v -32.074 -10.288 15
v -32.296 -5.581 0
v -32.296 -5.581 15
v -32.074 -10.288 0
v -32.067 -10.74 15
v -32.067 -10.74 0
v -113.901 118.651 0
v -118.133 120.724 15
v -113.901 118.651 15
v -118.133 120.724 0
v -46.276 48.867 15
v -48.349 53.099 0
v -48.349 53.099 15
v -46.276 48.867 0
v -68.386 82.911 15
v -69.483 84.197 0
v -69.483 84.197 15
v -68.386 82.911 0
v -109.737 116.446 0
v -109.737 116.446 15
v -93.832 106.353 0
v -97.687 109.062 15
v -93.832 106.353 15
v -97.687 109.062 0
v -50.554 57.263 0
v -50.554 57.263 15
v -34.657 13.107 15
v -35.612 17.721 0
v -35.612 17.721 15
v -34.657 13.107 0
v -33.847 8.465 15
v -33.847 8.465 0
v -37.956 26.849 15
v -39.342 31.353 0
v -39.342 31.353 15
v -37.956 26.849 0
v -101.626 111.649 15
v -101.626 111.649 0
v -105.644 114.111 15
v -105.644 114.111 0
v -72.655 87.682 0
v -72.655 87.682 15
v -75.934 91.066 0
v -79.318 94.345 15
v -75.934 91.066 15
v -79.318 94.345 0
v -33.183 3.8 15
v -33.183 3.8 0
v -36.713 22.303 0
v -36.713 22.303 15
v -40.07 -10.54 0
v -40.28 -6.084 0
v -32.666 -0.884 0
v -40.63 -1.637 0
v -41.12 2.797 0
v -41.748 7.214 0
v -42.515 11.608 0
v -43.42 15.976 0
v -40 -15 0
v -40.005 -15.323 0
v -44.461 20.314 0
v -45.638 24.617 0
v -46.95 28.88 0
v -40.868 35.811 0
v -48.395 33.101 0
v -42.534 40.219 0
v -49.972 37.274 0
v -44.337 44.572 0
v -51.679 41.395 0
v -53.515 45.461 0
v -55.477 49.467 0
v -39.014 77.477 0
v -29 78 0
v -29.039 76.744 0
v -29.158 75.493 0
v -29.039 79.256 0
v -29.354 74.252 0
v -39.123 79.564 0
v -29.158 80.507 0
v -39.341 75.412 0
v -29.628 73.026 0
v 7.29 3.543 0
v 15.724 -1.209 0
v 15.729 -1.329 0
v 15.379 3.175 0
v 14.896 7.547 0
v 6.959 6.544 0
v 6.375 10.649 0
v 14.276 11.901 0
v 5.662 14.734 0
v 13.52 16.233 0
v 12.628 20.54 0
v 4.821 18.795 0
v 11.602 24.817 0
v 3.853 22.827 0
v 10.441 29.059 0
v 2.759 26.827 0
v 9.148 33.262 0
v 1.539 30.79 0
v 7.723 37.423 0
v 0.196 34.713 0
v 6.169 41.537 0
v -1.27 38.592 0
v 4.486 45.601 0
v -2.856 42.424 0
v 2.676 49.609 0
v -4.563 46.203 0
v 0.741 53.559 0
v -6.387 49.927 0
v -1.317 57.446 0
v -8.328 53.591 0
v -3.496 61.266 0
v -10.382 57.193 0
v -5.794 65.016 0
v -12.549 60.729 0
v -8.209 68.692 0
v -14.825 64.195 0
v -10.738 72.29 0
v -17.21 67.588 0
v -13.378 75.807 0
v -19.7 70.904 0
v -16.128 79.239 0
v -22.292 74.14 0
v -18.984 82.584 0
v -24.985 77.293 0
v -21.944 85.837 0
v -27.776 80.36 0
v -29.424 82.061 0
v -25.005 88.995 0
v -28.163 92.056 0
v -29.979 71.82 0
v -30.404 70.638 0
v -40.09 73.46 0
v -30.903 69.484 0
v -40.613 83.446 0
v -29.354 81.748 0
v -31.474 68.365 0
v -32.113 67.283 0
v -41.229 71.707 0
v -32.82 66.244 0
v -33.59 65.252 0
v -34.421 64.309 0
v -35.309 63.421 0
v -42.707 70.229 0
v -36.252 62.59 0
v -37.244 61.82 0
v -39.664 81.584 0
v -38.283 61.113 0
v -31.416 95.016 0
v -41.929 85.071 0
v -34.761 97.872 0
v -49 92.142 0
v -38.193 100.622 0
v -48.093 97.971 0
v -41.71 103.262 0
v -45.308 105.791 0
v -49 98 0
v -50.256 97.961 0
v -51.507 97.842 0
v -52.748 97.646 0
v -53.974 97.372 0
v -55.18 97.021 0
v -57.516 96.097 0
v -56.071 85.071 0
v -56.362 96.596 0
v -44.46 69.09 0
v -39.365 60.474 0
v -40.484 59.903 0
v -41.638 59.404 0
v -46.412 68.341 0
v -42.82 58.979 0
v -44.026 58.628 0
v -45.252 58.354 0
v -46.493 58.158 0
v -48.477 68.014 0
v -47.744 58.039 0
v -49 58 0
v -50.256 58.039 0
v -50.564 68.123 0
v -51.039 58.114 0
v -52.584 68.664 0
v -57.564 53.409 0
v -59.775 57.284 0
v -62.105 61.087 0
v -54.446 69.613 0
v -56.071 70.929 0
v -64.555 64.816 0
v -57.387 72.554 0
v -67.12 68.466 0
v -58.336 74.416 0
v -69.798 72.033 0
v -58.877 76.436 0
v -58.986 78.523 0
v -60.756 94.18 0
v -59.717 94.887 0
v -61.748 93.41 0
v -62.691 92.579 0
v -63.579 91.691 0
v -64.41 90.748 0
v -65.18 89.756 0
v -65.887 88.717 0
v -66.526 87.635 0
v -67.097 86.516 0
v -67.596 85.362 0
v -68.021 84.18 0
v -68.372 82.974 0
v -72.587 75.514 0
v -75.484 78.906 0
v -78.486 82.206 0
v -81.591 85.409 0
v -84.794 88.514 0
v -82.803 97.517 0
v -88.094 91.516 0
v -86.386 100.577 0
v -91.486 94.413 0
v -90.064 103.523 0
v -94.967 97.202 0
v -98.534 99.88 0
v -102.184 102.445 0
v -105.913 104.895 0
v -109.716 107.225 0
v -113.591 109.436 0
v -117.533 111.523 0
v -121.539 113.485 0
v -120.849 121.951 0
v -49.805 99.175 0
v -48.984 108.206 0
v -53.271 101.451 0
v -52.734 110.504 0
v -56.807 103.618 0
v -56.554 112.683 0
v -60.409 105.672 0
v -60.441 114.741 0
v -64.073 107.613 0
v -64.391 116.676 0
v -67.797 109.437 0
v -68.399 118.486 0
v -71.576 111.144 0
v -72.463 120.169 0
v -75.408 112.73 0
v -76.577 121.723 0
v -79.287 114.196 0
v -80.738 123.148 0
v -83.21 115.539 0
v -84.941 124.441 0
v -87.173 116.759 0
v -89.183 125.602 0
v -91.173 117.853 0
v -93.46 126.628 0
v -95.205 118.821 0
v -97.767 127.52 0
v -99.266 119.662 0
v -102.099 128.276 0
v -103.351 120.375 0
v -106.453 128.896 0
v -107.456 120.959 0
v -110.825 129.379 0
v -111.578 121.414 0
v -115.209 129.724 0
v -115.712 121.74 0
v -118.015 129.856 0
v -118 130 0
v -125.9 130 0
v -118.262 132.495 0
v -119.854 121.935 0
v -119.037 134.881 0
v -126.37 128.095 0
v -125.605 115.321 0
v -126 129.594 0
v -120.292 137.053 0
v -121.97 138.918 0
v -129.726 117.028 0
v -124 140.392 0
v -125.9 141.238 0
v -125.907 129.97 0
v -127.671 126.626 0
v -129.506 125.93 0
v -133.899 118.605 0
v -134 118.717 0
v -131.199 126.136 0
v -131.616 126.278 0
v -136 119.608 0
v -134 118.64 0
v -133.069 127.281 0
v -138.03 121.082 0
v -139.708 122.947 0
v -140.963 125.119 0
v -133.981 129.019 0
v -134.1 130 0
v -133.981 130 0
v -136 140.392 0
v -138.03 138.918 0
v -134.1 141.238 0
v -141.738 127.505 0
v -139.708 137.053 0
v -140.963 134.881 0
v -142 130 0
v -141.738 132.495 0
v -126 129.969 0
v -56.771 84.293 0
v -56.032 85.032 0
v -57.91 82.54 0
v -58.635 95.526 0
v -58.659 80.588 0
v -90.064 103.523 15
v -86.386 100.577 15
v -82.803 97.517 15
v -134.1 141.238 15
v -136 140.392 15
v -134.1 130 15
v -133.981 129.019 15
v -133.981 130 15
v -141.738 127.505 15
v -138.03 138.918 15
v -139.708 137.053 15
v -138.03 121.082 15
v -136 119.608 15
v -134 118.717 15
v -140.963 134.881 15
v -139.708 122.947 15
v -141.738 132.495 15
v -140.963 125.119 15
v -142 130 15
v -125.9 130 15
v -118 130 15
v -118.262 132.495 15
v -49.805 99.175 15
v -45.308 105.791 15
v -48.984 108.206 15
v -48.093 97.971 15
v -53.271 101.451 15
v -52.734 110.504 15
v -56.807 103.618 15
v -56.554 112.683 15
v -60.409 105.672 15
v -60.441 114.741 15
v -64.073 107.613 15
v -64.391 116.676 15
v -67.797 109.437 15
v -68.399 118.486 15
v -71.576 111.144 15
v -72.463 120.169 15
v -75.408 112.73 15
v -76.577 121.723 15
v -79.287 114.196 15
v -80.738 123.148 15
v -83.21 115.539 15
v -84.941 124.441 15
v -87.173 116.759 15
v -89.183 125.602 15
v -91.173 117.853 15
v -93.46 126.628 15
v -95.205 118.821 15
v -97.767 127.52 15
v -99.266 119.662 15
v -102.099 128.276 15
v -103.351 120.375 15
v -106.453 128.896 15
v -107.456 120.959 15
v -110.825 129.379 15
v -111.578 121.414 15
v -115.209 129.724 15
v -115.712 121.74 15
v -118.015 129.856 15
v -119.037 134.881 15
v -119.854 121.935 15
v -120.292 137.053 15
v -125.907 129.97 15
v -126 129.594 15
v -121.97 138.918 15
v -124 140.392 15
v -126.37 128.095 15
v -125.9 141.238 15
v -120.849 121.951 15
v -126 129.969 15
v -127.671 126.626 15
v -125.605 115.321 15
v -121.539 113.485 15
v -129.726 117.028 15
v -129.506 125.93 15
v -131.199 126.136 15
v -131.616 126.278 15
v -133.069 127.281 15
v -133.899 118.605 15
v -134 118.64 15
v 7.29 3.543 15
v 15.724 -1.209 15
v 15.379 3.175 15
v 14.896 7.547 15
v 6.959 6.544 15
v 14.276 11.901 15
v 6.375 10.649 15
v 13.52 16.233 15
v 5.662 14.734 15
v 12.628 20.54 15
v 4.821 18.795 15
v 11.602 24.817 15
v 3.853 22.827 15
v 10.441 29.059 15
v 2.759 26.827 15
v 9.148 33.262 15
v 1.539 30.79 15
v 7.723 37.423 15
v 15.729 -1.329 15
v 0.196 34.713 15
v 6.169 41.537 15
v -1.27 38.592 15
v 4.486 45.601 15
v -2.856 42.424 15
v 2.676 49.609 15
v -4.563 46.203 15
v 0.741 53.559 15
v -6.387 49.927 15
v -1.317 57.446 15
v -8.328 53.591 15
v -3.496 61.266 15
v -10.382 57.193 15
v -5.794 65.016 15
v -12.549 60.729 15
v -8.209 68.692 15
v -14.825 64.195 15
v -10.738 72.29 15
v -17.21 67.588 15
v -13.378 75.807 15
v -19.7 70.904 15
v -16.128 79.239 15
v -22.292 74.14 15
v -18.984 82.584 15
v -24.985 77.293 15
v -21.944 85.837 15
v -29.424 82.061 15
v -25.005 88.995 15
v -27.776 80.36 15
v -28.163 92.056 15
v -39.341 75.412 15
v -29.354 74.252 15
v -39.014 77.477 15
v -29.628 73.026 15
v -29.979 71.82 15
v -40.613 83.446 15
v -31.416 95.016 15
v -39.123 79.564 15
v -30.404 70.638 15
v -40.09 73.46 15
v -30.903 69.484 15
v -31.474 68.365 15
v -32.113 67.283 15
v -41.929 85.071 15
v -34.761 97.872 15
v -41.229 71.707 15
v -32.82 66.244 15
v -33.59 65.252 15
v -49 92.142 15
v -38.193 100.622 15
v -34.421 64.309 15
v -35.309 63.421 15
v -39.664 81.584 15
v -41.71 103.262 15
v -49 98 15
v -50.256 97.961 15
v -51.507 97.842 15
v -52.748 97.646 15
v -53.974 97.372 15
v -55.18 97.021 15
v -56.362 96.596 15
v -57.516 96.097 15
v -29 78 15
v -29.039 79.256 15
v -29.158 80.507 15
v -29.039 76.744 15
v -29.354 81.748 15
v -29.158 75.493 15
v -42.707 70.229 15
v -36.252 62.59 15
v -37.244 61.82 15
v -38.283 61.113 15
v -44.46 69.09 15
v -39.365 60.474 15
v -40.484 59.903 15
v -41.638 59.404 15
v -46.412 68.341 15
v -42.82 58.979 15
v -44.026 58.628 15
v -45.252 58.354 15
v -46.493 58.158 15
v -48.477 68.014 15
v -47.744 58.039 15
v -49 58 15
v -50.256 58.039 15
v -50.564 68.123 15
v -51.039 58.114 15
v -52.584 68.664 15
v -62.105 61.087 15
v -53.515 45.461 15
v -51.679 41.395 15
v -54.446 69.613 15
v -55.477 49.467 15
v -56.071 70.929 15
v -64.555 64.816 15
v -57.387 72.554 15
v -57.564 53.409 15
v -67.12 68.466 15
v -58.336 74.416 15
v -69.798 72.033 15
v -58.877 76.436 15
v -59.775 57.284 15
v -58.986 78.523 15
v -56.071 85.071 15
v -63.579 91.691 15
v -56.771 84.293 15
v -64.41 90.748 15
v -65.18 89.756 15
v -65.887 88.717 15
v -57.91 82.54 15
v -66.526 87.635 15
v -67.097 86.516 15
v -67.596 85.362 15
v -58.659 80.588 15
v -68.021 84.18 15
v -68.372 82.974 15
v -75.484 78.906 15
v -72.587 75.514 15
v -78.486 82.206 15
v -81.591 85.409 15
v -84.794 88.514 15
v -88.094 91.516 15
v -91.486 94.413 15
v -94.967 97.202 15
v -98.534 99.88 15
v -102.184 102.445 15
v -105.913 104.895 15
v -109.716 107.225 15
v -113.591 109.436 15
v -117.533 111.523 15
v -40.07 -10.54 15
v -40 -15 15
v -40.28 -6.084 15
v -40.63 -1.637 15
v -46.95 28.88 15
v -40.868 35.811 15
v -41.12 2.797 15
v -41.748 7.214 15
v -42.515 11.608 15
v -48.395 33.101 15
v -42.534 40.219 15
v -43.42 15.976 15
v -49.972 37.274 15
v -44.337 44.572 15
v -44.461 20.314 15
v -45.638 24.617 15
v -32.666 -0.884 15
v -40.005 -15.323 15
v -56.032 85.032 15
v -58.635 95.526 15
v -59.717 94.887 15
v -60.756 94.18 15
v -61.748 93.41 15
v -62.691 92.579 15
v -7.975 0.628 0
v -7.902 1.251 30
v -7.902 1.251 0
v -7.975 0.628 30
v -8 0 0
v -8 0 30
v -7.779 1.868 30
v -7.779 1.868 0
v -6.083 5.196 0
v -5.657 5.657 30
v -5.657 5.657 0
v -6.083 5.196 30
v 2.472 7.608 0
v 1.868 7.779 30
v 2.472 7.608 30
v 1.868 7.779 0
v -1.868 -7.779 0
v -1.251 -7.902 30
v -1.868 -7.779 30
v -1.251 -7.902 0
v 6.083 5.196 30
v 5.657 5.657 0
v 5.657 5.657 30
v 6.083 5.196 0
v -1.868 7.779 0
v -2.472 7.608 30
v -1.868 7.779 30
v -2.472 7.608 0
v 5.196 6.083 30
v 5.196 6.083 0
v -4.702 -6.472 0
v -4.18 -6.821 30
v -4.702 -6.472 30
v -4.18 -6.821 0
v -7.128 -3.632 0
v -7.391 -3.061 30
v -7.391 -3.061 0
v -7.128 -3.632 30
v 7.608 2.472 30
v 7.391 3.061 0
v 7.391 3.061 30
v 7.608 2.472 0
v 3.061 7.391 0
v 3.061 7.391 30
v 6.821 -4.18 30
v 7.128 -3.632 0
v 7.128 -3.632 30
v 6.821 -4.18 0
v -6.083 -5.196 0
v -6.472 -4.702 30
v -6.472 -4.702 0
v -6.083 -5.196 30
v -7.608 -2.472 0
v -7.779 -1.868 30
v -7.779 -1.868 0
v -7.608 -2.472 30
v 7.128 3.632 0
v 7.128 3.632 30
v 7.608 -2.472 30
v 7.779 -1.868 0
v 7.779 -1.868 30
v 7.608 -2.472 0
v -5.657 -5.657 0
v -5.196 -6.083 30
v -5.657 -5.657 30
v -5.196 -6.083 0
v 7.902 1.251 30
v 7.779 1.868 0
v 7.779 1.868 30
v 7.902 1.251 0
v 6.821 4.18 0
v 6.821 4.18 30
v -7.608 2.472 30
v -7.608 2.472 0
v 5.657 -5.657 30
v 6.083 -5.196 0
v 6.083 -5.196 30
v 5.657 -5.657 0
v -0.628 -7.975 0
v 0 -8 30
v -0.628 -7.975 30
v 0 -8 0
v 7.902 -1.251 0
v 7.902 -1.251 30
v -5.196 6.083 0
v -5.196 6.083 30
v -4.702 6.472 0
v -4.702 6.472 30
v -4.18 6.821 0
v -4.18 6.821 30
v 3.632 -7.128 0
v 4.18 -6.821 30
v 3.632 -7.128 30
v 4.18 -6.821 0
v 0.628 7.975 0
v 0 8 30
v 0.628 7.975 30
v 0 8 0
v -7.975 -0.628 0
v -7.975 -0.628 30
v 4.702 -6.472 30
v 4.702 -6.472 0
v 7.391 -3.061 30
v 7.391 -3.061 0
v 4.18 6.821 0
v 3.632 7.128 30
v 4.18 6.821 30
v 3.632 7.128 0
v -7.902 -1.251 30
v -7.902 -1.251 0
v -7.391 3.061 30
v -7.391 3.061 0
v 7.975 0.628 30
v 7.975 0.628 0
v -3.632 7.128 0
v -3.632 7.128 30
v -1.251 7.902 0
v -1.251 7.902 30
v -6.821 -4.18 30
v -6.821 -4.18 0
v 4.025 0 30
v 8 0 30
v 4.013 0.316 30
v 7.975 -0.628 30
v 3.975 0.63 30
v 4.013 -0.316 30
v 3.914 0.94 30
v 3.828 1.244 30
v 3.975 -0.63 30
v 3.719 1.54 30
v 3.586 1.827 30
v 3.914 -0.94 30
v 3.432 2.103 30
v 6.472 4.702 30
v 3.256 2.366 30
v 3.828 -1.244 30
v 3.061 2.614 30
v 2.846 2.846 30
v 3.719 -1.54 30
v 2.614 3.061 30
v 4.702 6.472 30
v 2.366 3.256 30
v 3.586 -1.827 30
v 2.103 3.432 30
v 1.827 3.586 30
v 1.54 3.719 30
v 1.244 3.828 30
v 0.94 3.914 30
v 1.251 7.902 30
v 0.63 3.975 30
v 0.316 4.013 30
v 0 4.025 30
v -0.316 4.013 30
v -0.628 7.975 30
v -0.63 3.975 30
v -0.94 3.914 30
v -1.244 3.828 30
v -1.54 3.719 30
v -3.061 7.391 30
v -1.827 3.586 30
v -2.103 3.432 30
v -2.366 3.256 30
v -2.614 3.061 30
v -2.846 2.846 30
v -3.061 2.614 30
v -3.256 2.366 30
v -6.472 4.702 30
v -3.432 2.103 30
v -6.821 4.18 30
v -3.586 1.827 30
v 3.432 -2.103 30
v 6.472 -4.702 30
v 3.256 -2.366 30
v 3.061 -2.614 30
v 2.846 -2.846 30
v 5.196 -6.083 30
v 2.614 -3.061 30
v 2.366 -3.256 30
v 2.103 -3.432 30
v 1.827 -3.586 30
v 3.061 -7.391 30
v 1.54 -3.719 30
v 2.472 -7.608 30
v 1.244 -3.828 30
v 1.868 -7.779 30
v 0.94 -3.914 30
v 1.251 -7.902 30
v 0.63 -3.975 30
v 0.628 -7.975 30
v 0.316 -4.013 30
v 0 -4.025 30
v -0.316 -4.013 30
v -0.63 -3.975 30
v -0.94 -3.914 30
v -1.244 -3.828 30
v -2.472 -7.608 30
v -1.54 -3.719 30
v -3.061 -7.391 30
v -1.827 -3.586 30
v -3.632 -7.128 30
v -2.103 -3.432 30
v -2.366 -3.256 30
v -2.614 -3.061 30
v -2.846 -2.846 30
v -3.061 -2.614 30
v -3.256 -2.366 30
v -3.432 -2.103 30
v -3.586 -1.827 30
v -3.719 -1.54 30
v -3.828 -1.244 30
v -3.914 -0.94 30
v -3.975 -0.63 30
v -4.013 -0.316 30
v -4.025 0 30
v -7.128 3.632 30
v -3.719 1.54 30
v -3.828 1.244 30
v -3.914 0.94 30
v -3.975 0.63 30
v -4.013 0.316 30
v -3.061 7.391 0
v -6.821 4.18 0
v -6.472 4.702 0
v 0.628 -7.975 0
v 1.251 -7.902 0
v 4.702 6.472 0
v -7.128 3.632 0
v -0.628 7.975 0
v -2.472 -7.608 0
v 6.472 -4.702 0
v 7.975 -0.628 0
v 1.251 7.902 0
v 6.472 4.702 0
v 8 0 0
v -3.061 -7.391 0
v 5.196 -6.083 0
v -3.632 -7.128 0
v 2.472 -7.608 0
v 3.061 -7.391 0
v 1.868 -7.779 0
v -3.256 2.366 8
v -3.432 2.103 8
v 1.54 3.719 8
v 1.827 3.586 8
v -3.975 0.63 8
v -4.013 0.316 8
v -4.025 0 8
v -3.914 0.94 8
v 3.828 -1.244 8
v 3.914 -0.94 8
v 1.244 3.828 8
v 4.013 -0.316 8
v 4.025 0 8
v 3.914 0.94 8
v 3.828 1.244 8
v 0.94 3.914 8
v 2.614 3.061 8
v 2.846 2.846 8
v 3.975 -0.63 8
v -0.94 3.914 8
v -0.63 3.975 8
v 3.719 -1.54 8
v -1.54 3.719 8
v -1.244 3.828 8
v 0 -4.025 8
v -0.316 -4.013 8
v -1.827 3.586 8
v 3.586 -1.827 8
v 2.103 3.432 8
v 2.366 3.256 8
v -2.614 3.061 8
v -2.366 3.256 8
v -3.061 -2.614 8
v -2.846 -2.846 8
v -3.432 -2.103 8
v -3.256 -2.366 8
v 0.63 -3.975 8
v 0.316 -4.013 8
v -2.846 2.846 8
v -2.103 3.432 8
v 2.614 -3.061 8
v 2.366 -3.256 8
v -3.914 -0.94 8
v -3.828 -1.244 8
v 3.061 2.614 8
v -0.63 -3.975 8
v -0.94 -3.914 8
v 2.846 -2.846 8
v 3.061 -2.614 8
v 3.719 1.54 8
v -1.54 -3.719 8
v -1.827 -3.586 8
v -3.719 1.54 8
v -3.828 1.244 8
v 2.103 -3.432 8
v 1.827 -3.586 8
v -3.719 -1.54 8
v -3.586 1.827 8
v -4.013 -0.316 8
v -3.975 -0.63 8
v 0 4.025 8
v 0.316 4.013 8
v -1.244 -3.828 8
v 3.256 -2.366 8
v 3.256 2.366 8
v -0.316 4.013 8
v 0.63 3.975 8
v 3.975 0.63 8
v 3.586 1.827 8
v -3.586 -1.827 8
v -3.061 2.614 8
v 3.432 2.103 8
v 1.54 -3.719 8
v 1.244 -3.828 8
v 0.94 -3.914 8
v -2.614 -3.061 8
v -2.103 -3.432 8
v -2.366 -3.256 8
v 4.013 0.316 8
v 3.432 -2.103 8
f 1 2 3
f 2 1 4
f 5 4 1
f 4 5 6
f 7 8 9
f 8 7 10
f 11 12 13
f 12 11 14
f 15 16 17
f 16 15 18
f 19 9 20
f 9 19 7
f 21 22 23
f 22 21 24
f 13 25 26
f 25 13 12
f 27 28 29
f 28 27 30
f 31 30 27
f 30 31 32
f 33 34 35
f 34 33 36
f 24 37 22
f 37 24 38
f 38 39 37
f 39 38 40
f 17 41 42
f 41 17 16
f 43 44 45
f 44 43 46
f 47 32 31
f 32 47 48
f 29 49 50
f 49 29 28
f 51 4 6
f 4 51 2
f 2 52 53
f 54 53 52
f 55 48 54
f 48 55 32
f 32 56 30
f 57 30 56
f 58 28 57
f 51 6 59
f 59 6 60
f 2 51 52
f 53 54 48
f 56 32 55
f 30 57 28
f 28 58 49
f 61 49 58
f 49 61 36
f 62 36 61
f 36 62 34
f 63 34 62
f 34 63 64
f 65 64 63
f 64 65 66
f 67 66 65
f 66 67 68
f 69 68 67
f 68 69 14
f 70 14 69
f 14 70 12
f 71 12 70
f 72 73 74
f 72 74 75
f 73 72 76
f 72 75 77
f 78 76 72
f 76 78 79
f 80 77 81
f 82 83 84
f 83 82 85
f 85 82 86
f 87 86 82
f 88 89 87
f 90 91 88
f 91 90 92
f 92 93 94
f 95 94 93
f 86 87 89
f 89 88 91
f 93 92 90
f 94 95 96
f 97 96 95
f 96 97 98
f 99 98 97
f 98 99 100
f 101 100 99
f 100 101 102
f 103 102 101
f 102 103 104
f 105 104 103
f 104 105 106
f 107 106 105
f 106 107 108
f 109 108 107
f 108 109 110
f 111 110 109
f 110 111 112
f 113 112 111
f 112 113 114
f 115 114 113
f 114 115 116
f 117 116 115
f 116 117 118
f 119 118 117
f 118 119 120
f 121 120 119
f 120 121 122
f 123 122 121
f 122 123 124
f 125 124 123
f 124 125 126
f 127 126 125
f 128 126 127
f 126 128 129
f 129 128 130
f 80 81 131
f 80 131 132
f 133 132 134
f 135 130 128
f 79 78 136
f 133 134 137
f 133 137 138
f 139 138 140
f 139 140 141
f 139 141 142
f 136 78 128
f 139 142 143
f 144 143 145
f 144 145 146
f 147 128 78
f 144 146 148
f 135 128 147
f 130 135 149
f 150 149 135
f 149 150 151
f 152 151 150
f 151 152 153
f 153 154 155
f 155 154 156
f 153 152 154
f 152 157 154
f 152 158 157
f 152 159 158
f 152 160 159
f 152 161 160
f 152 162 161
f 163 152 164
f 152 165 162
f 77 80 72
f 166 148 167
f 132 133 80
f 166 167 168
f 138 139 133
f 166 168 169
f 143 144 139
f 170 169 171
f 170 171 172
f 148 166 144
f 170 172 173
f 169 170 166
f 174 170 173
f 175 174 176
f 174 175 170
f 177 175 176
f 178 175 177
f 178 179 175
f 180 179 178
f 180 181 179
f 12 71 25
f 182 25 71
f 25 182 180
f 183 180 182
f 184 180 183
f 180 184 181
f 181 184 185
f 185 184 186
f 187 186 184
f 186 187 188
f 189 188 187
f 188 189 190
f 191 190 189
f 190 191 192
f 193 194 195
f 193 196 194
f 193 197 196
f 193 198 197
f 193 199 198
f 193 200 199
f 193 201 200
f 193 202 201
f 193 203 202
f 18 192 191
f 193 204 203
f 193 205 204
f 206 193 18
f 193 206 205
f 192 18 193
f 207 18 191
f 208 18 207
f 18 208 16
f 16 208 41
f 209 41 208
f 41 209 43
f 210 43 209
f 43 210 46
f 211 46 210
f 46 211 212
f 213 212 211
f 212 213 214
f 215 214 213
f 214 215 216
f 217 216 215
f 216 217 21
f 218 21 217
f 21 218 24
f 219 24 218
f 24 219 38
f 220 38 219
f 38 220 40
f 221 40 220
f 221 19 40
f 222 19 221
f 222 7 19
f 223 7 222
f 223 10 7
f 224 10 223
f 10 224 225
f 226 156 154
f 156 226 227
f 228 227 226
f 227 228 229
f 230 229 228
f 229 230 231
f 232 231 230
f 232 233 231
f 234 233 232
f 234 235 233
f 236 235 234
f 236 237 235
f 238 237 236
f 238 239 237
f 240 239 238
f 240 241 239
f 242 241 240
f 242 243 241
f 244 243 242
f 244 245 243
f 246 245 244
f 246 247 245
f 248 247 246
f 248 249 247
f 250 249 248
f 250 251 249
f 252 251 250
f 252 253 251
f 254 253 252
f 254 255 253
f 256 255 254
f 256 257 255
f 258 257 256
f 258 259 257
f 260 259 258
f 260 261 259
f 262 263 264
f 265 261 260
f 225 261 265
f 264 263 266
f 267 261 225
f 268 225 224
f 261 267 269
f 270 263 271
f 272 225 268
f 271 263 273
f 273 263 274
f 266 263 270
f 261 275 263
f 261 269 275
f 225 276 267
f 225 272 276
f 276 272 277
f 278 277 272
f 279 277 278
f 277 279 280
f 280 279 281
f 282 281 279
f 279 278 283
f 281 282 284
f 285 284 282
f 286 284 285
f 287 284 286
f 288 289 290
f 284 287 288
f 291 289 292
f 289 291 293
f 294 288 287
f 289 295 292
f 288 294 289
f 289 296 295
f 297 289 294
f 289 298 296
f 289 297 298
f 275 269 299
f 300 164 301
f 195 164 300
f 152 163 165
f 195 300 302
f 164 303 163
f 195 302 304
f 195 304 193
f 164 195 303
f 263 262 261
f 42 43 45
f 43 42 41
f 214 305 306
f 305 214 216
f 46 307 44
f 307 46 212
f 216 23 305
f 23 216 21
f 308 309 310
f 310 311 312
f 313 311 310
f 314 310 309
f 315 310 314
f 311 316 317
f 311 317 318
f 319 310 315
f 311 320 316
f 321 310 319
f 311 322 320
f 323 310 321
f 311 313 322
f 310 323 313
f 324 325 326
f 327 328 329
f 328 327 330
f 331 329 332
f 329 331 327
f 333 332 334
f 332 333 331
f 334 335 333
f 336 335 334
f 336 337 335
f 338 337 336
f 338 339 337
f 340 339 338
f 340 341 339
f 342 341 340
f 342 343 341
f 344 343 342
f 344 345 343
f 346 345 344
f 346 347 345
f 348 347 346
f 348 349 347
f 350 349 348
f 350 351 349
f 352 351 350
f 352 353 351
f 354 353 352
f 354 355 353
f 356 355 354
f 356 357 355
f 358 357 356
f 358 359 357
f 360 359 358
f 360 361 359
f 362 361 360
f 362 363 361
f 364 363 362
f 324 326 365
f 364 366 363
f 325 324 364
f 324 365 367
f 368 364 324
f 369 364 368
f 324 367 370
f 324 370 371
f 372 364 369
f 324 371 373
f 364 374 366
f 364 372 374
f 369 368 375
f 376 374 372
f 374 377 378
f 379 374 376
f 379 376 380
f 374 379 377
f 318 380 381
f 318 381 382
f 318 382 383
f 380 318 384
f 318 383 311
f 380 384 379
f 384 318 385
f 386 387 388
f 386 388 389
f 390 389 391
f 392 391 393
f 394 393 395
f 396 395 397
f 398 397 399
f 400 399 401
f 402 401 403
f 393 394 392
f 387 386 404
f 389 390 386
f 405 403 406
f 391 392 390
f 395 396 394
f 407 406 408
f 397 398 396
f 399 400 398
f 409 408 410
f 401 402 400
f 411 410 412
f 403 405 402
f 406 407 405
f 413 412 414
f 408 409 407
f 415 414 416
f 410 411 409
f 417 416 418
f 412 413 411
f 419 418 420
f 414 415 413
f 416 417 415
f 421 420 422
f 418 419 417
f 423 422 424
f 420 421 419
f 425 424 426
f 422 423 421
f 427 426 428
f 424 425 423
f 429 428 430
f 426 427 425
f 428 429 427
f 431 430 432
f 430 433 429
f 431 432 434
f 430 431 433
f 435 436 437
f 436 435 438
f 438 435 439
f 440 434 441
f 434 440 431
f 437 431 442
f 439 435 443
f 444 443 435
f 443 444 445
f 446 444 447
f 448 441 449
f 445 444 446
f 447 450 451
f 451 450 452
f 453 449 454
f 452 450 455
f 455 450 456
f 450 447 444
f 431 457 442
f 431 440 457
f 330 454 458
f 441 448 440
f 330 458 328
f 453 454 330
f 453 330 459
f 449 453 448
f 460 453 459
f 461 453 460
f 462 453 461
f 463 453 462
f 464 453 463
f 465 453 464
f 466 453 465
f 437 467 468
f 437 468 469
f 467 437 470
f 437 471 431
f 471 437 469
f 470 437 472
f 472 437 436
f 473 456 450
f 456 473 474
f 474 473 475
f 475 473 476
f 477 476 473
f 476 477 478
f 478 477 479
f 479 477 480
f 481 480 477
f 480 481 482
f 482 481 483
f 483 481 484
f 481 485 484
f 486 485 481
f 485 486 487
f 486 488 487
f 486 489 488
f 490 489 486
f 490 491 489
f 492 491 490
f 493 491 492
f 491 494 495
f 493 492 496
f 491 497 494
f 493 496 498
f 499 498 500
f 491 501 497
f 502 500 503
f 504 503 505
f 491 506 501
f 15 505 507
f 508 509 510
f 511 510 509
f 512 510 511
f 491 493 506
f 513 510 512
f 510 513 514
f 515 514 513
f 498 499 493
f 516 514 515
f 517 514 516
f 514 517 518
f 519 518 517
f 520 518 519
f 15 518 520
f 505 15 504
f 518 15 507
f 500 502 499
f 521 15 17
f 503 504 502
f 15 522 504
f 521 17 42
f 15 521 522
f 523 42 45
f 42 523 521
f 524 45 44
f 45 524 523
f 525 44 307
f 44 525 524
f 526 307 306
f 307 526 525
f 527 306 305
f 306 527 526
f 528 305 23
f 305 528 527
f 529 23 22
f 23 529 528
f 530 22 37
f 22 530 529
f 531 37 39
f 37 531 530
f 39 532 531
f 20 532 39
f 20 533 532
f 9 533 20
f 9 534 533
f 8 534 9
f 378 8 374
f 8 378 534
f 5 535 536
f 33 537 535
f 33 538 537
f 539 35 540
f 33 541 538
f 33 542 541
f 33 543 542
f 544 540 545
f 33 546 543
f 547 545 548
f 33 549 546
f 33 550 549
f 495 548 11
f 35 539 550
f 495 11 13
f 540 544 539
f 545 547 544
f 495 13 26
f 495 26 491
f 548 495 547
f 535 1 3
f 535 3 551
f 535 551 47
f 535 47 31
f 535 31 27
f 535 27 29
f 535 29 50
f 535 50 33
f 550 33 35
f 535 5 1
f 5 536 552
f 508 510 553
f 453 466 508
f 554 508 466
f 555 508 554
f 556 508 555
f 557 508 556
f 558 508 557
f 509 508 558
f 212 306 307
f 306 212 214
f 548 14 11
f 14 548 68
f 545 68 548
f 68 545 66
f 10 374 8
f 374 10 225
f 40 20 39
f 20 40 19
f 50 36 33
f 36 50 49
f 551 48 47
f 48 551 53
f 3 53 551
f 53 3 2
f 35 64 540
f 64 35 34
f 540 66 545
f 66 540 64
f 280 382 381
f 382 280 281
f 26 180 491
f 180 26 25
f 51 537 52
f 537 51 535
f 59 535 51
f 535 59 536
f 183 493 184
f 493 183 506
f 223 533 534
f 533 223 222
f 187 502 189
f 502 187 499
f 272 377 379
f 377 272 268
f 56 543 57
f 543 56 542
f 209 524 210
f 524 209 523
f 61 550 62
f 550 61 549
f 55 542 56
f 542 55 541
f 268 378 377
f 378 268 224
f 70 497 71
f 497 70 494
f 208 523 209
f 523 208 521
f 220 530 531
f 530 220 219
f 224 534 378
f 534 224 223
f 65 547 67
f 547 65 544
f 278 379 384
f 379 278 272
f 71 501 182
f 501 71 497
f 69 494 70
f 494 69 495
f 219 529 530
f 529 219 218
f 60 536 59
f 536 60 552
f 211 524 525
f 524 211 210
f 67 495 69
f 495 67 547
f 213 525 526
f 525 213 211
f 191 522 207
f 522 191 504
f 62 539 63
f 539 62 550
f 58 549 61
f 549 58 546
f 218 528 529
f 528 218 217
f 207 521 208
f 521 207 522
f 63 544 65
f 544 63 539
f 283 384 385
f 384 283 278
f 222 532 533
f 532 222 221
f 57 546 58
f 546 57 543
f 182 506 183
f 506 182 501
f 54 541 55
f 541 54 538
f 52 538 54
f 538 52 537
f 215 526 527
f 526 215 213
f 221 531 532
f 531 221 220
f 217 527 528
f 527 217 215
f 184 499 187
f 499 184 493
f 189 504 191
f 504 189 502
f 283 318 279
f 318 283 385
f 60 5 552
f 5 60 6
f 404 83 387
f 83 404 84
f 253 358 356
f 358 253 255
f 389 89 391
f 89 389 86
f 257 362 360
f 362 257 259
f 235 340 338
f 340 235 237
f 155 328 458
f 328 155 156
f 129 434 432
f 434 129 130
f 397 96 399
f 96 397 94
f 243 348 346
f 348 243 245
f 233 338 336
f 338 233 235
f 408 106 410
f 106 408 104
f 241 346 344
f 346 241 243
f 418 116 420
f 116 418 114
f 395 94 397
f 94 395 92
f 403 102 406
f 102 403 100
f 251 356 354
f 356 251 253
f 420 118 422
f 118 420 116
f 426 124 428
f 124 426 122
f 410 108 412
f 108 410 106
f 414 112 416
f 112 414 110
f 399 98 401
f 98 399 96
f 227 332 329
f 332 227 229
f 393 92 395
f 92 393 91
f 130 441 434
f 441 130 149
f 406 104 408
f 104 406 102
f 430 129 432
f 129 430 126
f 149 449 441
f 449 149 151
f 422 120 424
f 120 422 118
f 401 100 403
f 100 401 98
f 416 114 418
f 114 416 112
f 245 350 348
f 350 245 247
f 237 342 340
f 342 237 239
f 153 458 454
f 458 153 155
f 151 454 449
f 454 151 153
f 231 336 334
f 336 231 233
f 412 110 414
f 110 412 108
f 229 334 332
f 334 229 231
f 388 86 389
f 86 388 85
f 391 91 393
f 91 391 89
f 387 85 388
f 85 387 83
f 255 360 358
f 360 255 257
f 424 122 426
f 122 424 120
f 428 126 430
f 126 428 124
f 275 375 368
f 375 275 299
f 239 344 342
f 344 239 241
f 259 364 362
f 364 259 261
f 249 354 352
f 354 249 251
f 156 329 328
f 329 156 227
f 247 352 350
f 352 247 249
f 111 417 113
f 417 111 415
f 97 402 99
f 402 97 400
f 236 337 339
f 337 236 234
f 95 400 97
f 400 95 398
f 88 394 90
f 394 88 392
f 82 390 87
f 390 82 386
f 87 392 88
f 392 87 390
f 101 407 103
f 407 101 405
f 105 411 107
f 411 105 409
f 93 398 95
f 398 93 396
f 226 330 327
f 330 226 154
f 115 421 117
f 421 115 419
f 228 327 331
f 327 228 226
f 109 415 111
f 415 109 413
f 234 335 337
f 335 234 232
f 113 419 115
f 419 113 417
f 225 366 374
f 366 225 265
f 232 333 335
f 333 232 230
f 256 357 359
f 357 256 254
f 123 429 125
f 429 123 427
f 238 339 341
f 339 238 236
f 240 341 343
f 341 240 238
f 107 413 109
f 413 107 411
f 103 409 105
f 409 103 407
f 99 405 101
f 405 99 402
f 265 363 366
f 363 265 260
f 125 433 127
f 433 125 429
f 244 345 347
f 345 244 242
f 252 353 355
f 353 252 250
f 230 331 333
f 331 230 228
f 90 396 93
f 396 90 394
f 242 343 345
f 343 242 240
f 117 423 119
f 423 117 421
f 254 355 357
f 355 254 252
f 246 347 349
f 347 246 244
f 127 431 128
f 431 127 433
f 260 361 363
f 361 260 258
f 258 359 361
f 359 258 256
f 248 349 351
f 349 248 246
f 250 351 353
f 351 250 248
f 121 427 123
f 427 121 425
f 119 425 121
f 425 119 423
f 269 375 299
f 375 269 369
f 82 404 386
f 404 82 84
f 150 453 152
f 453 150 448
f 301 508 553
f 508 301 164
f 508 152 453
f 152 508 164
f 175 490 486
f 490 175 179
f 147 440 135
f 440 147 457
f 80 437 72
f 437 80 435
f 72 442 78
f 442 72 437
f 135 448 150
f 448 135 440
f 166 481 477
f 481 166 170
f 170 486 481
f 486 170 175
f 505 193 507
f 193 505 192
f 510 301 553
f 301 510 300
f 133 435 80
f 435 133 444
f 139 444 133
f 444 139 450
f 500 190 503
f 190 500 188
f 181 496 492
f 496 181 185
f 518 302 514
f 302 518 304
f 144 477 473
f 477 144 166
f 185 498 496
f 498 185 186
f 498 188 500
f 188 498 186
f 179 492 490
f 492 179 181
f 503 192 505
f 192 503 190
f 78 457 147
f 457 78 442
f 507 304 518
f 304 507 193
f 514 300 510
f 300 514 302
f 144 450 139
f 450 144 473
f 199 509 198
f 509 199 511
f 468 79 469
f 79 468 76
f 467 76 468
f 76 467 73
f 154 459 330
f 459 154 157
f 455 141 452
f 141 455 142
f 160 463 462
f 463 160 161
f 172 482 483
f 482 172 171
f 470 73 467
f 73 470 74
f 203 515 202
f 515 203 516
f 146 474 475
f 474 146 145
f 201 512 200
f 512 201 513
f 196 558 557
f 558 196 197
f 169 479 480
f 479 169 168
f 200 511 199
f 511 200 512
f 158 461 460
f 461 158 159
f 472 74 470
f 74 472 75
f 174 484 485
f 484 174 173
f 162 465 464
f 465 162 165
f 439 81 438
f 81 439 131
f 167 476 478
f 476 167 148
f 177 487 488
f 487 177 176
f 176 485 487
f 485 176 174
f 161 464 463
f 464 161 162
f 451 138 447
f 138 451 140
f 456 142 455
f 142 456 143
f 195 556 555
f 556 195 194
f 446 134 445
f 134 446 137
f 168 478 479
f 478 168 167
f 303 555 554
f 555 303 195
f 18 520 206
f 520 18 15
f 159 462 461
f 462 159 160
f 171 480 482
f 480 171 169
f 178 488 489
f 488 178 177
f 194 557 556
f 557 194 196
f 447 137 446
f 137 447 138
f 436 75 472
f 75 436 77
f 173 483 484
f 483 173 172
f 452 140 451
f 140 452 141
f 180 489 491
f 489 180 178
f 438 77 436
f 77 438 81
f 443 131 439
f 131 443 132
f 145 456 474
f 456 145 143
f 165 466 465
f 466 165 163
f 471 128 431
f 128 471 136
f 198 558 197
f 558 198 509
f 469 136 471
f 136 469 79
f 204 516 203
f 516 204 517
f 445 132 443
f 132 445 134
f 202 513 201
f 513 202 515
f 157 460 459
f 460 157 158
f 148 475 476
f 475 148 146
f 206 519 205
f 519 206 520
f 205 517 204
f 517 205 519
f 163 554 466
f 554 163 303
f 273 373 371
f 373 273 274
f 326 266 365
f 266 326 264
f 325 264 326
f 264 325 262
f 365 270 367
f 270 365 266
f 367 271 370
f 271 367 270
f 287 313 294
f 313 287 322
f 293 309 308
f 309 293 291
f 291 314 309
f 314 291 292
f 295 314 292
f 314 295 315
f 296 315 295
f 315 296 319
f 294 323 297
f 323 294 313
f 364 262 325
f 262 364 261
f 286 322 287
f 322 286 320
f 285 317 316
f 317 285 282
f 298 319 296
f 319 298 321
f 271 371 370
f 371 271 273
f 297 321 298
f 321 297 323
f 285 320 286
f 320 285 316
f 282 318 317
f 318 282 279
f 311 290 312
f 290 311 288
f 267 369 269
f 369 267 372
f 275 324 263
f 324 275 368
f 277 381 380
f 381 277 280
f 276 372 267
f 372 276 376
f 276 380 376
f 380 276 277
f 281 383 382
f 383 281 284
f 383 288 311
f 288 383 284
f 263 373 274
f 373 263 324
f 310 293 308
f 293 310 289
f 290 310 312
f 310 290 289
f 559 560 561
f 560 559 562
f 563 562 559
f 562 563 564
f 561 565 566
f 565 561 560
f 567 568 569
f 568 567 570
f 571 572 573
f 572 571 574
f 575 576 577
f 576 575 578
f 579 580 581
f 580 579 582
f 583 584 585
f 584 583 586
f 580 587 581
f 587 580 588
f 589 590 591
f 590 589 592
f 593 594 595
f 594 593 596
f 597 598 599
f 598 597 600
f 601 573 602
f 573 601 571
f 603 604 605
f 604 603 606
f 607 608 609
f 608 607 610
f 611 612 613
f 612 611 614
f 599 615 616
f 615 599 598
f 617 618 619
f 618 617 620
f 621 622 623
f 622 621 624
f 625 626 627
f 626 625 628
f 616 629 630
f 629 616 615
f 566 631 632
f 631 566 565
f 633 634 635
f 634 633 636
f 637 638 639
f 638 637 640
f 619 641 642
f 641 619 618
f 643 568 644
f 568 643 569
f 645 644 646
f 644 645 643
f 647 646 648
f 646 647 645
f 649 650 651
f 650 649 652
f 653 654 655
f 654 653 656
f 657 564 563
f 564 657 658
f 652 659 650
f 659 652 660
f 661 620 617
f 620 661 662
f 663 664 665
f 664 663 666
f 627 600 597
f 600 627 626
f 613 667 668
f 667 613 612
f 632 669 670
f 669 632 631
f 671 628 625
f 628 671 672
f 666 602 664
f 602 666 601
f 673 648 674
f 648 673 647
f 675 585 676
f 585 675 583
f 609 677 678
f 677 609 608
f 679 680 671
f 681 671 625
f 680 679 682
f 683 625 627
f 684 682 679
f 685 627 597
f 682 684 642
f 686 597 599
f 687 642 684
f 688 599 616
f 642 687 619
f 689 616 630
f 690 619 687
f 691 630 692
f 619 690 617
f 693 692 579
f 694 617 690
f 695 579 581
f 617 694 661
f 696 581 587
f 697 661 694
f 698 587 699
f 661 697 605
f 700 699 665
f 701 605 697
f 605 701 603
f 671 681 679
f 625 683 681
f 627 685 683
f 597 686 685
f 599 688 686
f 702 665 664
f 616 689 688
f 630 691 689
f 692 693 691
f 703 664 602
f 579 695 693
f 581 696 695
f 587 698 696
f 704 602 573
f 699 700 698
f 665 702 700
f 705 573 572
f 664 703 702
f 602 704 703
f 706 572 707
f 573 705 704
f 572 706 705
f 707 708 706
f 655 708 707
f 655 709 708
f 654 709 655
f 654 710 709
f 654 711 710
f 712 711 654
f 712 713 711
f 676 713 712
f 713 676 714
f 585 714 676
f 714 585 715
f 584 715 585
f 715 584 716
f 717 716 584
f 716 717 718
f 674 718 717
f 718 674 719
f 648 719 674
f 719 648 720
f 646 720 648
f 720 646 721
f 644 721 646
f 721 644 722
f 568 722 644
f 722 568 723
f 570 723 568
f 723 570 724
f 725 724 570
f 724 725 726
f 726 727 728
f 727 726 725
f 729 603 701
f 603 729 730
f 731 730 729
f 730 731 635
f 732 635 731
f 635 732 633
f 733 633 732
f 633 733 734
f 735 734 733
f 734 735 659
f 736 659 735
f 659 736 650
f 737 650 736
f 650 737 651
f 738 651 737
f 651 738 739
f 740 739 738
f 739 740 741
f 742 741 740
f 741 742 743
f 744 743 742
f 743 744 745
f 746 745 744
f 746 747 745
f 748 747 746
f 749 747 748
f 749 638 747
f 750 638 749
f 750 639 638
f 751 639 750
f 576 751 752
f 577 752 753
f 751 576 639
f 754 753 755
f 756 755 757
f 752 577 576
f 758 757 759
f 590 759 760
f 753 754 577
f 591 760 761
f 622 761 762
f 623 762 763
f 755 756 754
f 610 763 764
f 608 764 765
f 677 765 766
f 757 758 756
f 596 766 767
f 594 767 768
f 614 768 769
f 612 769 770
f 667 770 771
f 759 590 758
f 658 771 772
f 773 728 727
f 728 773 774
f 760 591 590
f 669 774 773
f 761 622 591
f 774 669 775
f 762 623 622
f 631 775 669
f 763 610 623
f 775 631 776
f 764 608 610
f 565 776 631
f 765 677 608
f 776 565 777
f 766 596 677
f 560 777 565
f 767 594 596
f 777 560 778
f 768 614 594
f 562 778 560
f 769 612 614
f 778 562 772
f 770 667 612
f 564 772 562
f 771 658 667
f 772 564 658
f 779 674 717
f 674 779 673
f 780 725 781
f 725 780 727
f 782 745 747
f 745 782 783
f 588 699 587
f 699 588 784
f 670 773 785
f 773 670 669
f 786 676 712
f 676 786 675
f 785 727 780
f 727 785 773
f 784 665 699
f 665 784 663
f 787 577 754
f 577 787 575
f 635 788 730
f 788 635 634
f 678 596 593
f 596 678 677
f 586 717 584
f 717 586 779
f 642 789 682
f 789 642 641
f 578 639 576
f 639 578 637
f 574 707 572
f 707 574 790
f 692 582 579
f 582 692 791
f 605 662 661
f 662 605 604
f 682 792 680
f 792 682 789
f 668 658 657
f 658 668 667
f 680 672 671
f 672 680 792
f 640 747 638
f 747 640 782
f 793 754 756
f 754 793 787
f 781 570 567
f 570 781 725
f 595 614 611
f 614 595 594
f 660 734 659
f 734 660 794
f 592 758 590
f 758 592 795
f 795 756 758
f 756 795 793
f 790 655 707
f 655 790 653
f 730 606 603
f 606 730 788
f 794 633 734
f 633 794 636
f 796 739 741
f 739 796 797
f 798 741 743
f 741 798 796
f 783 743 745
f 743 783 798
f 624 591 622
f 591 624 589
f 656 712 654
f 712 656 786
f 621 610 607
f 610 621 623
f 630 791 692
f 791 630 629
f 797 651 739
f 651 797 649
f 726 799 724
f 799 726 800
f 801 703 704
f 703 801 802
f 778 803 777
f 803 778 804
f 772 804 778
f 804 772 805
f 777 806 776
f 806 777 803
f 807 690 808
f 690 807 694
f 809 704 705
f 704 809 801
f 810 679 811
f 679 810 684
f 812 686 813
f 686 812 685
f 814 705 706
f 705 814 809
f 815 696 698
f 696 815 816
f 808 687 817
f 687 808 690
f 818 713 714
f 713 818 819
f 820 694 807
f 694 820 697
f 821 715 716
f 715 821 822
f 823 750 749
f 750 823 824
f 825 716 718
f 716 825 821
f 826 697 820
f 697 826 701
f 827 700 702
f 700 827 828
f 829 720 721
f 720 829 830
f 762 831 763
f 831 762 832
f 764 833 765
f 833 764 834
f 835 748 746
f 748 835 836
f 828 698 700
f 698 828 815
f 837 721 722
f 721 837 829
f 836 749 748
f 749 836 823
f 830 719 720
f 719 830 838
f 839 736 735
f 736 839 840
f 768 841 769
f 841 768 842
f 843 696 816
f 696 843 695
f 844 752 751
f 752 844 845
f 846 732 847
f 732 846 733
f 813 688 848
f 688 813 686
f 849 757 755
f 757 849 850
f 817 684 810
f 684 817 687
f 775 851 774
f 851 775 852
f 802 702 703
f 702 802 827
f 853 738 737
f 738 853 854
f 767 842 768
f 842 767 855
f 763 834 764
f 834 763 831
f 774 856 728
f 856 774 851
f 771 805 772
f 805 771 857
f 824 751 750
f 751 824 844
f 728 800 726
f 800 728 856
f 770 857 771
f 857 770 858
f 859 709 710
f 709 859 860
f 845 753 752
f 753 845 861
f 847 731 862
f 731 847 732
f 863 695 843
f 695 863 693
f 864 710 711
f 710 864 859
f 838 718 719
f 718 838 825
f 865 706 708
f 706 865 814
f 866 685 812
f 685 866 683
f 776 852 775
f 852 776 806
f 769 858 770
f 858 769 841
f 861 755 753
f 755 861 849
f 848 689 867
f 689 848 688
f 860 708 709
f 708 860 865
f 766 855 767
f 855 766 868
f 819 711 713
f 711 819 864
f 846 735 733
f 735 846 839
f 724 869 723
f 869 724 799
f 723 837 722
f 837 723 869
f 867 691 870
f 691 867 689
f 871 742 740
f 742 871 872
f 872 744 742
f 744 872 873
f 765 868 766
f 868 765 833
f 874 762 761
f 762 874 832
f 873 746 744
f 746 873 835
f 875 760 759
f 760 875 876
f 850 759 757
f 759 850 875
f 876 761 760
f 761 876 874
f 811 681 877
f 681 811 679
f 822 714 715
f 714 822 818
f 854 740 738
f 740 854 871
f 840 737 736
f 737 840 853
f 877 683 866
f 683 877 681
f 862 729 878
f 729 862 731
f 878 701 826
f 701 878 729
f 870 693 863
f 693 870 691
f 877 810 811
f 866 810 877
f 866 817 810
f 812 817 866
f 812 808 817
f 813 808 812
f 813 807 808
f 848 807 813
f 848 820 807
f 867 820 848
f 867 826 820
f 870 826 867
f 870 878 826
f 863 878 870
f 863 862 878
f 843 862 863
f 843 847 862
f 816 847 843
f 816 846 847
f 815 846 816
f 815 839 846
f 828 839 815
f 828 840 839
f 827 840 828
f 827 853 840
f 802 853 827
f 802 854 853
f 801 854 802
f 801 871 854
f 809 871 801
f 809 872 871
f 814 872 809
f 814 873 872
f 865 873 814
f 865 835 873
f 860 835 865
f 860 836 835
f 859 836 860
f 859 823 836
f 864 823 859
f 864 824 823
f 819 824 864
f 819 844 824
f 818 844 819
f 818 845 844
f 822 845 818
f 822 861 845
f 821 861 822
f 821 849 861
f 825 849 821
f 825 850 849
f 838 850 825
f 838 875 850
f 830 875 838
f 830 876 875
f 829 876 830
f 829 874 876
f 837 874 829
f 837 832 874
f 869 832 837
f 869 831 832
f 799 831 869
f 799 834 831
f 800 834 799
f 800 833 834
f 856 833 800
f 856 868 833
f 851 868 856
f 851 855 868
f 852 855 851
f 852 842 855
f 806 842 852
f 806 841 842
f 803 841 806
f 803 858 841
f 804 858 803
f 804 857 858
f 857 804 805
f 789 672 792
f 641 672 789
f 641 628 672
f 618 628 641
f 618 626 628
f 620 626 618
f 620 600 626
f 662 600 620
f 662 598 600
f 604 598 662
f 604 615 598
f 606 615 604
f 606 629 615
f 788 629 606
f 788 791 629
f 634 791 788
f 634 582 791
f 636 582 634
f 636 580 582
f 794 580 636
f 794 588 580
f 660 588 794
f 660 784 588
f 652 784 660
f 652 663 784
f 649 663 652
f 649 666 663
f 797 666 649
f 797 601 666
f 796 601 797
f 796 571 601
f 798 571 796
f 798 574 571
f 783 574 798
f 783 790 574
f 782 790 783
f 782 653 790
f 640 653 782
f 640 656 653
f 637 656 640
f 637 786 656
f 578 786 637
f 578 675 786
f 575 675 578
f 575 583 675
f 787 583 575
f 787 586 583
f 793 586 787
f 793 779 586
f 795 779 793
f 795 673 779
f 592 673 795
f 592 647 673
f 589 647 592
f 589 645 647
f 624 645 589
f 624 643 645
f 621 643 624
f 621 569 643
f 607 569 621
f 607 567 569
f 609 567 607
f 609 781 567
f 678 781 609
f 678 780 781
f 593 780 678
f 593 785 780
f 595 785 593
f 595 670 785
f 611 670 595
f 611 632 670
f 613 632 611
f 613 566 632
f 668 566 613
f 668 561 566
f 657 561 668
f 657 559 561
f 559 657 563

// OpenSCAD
// Mendel Filament Holder V2
//
//   based on the Mendel Filament Guide
// 
// Author: Robert H. Morrison
// Date..: 29 April 2012
//
// License GNU GPL v2 or newer.

M3=4.02; 
M8=8.05;

vertex_height=30;
filament_roll_r=150;

FN=80;

module filament_guide(side) { 
	translate([0,side*10,0]) rotate([90+90*side,0,0]) difference()
	{
		union() {
			translate ([17.25295,-55,0])
				rotate([0,0,60.0])
					difference() 
			{
				union () {
					linear_extrude(file = "vertex-body-fixed-qcad.dxf",
						height=vertex_height,center=true);
				}
			
				translate([11.013,59.912]) zhole(M8); 
				translate([40.274,9.249,0]) zhole(M8); 
			}
			cylinder(h=60,r=8,center=true,$fn=FN);
		}
	
		translate([0,0,58]) zhole(M8);
		translate([0,0,-58]) zhole(M8);
	
		translate([0,0,side*25]) cube([100,100,50], true);
	
		translate([-2,-39.275,12.5])
			rotate([0,0,-60])
				cube([50,50,100], true);
	
		translate([-32,19.65,12.5])
			rotate([0,0,-60])
				cube([50,50,100], true);
	
		translate([32,19.65,12.5])
			rotate([0,0,60])
				cube([50,50,100], true);
	
		translate([12.75,-22,12.5])
			rotate([0,0,60])
				cube([28,28,100], true);
	
		translate([28,-28,12])
			rotate([0,0,60])
				cube([12,12,100], true);
	
		translate([-22,-11.4,12.5])
			rotate([0,0,-60])
				cube([8,16,100], true);
	
		translate([-15,-12,12.5])
			rotate([0,0,30])
				cube([8,16,100], true);
	
		translate([-9,-17.19,12.5])
			rotate([0,0,-20])
				cube([22,22,100], true);
	
		translate([-15.5,-17.19,12.5])
			rotate([0,0,25])
				cube([12,12,100], true);
	}
}

module zhole(diameter) cylinder(h=100,r=(diameter/2),center=true,$fn=FN); 

module zteardrop(diameter,height)
{
	rotate([0,0,45]) {
		union() {
			translate([0,0,-height/2]) {
				cube([diameter/2,diameter/2,height], false);
			}
			cylinder(r = diameter/2, h = height, center=true);
		}
	}
} 

module MendelFilamentHolder(side)
{
	translate([0,0,vertex_height/4-side*(vertex_height/4)]) rotate([90-90*side,0,0]) {
		translate([-filament_roll_r+20,filament_roll_r-20,vertex_height/4])
		%	cylinder(h=vertex_height/4, r=filament_roll_r, center=true);
		
		// lower strut
		translate([-filament_roll_r-32,-15,vertex_height/4])
			difference() {
				cylinder(h=vertex_height/2, r=filament_roll_r, center=true, $fn=200);
				cylinder(h=vertex_height/2+1, r=filament_roll_r-8, center=true, $fn=200);
				translate([-filament_roll_r+48,0])
					cube([300, 300, vertex_height/2+1], true);
				translate([110,-192,0])
					rotate([0,0,30])
						cube([300, 300, vertex_height/2+1], true);
			}
		
		// upper strut
		translate([-filament_roll_r+26,-10,vertex_height/4])
			difference() {
				cylinder(h=vertex_height/2, r=filament_roll_r-10, center=true, $fn=200);
				cylinder(h=vertex_height/2+1, r=filament_roll_r-18, center=true, $fn=200);
				translate([-filament_roll_r-2,0,0])
					cube([300, 300, vertex_height/2+1], true);
				translate([144,-167,0])
					rotate([0,0,-30])
						cube([300, 300, vertex_height/2+1], true);
			}
		
		// upper/lower connector w/RepRap LOGO
		translate([-filament_roll_r/2+26,filament_roll_r/2+3,vertex_height/4])
			difference() {
				cylinder(h=vertex_height/2, r=20, center=true, $fn=100);
				zteardrop(20,vertex_height/2+1);
			}
		
		// filament spool rod holder
		translate([-filament_roll_r+20,filament_roll_r-20,vertex_height/4])
			difference() {
				cylinder(h=vertex_height/2, r=12, center=true);
				cylinder(h=vertex_height/2+1, r=4.1, center=true);
				translate([0,50,0])
					cube([8.2,100,vertex_height/2+1,], center=true);
			}
	}

	rotate([0,0,180])
		translate([0,-10*side,0])
			filament_guide(side);
}

//---------------------------------------
//	Change the parameter to select if
// you want to create the
//	LEFT or RIGHT side filament holder.
//---------------------------------------
//	-1 for LEFT, 1 for RIGHT

MendelFilamentHolder(1);
